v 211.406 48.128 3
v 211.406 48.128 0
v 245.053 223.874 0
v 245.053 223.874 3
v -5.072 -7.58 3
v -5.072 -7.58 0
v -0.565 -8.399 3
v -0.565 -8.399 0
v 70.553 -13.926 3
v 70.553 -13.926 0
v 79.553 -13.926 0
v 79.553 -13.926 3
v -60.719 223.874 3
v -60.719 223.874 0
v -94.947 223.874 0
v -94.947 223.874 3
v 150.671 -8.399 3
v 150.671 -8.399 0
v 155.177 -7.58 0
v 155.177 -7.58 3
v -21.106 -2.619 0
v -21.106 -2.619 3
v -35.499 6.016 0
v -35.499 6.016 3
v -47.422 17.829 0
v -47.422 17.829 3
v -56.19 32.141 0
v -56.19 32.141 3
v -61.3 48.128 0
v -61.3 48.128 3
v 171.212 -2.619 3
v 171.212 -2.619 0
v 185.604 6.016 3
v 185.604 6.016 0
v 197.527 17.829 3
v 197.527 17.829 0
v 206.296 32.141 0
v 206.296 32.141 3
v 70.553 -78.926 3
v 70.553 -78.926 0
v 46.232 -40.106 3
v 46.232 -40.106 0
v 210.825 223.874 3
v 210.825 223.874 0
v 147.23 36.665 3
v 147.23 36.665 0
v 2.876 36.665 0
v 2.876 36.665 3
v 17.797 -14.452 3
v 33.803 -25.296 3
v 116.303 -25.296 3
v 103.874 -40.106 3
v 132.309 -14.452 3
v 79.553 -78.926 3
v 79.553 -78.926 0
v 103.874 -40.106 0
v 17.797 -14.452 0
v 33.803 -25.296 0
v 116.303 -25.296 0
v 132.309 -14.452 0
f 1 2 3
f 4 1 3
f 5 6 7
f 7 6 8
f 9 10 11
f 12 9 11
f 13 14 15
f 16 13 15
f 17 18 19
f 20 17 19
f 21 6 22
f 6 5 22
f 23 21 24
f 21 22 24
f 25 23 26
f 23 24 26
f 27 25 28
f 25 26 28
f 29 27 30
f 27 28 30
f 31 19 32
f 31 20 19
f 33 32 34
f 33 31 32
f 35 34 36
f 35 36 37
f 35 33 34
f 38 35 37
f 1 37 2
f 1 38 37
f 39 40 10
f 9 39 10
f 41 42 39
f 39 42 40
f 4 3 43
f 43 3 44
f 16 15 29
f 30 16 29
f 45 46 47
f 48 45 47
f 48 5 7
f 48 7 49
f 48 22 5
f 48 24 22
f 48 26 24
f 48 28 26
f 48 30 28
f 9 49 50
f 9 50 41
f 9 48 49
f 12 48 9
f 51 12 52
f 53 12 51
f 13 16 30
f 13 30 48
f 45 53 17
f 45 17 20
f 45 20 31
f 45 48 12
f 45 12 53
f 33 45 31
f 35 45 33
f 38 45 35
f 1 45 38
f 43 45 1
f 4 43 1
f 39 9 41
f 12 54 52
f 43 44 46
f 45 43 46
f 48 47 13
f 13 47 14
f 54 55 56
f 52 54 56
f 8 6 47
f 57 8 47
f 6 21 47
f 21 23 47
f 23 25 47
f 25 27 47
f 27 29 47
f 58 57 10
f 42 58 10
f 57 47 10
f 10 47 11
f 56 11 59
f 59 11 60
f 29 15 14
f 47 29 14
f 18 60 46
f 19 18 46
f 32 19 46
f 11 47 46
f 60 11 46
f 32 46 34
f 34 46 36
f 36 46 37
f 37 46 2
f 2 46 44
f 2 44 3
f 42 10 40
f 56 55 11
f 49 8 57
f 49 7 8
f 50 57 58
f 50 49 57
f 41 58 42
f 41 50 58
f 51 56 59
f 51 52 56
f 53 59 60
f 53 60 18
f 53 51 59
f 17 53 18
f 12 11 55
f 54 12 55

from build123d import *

# Parameters (mm, degrees)
BOSS_EXTRU_3_DEPTH = 3
CONG_2_R           = 70


with BuildPart() as part:
    # Esquisse3 → Boss.-Extru.3 (new body)
    with BuildSketch(Plane.XY):
        Polygon((-52.277721614, 1.004022038), (29.829851332, -13.926203114), (70.552829187, -78.926203114), (70.552829187, -13.926203114), (79.552829187, -13.926203114), (79.552829187, -78.926203114), (120.275807042, -13.926203114), (202.383379989, 1.004022038), (245.052829187, 223.873796886), (210.825087382, 223.873796886), (147.229762937, 36.664572693), (2.875895437, 36.664572693), (-60.719429007, 223.873796886), (-94.947170813, 223.873796886), align=None)
    extrude(amount=BOSS_EXTRU_3_DEPTH)

    # Congé2
    cong_2_edges = [part.edges().sort_by_distance(p)[0] for p in [
        (202.383379989, 1.004022038, 1.5),
        (120.275807042, -13.926203114, 1.5),
        (29.829851332, -13.926203114, 1.5),
        (-52.277721614, 1.004022038, 1.5),
    ]]
    fillet(cong_2_edges, radius=CONG_2_R)


solid = part.part
